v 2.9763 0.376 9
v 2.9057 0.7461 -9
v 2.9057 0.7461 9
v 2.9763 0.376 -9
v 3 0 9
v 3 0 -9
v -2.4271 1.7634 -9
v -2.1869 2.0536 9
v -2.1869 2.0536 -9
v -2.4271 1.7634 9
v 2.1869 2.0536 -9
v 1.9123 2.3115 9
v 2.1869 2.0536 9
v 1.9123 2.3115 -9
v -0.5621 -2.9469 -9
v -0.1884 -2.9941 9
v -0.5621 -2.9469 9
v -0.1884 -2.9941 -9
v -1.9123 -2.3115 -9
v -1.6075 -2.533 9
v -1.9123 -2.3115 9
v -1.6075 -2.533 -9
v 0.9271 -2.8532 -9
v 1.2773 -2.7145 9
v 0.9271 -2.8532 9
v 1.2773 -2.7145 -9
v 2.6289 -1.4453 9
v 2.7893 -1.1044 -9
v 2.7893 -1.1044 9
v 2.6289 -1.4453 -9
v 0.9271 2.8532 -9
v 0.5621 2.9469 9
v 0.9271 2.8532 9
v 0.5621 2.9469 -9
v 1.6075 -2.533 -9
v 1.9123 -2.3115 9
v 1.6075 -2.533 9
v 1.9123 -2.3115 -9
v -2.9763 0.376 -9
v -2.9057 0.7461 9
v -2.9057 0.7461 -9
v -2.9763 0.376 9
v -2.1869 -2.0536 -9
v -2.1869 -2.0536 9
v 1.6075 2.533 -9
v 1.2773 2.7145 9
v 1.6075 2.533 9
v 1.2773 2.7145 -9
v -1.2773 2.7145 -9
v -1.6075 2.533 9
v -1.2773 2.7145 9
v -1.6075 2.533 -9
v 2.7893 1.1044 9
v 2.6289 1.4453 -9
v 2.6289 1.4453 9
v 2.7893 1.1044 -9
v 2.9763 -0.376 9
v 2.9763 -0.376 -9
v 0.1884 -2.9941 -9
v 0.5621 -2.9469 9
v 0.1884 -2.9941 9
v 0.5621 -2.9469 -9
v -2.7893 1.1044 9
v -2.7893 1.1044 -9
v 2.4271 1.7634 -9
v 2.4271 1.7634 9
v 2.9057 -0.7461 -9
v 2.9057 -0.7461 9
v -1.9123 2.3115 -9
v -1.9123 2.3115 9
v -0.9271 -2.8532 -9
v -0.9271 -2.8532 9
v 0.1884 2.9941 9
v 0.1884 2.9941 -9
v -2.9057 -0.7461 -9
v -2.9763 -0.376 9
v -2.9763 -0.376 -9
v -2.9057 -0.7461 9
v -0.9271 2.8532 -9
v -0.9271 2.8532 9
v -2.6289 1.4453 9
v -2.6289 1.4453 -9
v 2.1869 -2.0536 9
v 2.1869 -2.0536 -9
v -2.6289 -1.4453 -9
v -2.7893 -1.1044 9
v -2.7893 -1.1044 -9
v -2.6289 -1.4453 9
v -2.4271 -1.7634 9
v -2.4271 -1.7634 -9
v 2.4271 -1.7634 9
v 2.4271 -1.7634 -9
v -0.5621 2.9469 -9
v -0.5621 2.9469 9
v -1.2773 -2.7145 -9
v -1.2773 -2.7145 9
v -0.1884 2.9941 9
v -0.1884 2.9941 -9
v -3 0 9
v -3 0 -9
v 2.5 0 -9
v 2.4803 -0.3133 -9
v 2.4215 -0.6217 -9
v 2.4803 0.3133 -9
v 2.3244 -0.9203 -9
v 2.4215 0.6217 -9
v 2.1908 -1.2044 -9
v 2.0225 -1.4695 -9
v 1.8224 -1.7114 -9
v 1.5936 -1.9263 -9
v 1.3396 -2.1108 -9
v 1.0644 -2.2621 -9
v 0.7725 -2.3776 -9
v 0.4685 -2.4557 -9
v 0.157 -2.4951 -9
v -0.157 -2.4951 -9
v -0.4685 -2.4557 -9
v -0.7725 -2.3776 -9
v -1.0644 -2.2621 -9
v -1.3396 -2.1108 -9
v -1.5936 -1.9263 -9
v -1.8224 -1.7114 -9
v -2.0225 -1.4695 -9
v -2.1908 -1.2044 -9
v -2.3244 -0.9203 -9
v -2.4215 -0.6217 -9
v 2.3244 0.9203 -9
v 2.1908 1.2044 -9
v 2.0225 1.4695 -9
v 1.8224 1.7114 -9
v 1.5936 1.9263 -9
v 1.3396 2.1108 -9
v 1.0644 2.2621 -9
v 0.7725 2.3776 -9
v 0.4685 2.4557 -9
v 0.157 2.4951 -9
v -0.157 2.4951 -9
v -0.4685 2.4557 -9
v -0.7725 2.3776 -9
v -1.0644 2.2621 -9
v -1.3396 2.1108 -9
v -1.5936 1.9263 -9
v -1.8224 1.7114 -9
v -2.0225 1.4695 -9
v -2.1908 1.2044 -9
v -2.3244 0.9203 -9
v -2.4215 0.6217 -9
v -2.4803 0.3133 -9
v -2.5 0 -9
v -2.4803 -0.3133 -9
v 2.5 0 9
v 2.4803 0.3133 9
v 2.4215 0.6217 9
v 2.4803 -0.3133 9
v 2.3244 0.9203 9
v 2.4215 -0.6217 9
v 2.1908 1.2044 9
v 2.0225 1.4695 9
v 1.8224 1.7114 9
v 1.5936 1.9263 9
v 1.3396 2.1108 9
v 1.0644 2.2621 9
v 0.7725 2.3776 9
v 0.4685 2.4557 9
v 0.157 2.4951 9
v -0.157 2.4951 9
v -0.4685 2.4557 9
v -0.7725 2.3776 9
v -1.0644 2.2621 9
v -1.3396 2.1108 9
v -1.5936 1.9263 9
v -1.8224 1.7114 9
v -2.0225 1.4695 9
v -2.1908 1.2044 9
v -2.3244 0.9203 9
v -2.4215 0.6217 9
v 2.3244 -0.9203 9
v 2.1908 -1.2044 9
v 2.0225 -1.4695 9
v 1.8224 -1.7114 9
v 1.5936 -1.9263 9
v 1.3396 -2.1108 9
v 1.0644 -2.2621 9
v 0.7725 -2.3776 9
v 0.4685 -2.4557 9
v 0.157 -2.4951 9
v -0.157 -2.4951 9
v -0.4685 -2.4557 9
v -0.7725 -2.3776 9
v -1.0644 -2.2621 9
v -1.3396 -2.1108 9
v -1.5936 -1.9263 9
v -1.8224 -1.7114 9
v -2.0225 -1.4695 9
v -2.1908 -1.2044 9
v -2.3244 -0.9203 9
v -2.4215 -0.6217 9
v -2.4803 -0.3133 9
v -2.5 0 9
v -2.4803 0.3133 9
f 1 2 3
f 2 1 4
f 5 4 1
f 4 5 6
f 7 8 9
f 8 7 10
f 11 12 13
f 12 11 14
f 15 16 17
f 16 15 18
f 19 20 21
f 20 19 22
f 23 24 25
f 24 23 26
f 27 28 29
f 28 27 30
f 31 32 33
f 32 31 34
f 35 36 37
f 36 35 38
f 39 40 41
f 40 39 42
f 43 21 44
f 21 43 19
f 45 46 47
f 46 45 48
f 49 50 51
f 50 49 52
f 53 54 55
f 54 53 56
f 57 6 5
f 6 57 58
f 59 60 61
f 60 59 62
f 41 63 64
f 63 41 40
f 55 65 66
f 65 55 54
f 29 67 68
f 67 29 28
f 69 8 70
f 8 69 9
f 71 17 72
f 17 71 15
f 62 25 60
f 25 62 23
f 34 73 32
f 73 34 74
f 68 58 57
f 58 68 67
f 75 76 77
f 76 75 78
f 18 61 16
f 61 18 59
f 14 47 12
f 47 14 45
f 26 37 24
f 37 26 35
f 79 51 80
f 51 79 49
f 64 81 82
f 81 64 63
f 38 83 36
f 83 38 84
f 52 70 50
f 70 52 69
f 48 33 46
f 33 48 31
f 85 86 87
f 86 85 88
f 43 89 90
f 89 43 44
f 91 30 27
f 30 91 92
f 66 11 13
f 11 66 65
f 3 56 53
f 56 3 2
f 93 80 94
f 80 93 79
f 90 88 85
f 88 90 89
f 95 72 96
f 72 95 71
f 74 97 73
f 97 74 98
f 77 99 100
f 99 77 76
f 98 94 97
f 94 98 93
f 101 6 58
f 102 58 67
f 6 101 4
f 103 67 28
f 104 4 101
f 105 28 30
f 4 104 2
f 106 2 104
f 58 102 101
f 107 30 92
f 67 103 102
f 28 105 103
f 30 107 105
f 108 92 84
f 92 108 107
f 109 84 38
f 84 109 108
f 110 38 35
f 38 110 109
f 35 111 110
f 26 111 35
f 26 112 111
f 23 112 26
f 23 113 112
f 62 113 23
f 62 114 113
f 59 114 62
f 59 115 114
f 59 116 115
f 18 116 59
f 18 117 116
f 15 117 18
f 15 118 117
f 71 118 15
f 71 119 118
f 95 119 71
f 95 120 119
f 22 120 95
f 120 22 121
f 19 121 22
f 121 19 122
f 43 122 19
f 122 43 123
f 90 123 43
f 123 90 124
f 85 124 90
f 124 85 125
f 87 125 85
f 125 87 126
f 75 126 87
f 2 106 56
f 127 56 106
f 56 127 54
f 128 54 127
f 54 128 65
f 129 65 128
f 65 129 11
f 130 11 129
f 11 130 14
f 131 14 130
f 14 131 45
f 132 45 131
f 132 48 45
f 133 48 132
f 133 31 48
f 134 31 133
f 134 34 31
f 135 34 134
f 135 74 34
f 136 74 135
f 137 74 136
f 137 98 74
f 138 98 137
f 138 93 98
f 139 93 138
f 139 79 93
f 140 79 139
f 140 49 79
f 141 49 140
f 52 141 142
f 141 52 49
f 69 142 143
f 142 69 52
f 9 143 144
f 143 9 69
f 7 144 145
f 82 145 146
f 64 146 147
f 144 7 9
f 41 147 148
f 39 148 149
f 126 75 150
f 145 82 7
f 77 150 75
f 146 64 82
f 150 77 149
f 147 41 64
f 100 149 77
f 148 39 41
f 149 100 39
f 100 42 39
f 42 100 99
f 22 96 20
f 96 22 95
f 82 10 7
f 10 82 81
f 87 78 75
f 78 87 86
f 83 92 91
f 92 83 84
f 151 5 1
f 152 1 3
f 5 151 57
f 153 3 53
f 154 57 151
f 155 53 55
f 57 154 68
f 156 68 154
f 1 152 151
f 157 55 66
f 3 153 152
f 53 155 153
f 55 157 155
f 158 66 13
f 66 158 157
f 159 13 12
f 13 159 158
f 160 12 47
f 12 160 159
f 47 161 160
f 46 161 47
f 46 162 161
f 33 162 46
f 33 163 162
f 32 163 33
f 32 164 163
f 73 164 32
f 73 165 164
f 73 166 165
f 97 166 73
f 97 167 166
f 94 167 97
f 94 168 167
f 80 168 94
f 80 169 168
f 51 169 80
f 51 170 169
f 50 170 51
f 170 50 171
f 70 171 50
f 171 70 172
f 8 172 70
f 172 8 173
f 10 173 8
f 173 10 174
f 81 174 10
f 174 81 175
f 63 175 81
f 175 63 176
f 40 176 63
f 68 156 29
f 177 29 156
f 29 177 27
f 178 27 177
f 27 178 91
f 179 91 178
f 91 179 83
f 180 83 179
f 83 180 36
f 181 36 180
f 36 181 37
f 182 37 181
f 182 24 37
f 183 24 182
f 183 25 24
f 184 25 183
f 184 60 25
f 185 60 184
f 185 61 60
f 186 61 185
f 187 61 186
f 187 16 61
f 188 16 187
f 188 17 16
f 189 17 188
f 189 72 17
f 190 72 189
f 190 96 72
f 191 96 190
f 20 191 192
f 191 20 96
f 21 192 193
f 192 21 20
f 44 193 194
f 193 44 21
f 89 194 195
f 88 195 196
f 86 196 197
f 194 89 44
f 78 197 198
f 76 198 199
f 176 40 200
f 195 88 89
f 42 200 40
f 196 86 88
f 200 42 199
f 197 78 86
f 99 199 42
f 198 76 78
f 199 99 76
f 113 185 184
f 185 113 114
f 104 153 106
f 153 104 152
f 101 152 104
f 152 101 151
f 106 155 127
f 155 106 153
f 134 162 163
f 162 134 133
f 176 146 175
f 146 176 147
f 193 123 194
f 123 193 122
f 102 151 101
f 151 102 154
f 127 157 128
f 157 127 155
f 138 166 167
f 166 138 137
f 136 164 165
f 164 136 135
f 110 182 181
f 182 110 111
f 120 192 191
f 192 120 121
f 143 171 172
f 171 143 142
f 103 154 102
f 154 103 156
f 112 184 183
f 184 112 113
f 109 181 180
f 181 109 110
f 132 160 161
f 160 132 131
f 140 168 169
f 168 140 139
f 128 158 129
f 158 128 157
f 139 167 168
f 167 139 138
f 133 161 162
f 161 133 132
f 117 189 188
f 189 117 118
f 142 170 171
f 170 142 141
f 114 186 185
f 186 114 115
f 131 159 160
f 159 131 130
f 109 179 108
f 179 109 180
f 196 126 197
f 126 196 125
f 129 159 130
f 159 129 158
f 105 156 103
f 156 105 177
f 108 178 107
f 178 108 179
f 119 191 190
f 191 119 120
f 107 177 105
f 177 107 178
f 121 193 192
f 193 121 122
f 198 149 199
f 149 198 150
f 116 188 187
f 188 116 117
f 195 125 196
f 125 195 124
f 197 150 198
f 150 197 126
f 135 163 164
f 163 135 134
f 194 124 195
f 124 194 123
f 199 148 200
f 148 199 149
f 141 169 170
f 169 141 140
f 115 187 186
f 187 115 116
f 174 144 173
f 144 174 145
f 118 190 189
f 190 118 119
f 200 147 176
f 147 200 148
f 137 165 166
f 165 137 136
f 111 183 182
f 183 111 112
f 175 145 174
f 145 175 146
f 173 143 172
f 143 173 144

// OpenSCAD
$fn = 50;


difference() {
	union() {
		translate(v = [0, 0, -9.0000000000]) {
			cylinder(h = 18, r = 3.0000000000);
		}
	}
	union() {
		translate(v = [0, 0, -100.0000000000]) {
			cylinder(h = 200, r = 2.5000000000);
		}
	}
}
